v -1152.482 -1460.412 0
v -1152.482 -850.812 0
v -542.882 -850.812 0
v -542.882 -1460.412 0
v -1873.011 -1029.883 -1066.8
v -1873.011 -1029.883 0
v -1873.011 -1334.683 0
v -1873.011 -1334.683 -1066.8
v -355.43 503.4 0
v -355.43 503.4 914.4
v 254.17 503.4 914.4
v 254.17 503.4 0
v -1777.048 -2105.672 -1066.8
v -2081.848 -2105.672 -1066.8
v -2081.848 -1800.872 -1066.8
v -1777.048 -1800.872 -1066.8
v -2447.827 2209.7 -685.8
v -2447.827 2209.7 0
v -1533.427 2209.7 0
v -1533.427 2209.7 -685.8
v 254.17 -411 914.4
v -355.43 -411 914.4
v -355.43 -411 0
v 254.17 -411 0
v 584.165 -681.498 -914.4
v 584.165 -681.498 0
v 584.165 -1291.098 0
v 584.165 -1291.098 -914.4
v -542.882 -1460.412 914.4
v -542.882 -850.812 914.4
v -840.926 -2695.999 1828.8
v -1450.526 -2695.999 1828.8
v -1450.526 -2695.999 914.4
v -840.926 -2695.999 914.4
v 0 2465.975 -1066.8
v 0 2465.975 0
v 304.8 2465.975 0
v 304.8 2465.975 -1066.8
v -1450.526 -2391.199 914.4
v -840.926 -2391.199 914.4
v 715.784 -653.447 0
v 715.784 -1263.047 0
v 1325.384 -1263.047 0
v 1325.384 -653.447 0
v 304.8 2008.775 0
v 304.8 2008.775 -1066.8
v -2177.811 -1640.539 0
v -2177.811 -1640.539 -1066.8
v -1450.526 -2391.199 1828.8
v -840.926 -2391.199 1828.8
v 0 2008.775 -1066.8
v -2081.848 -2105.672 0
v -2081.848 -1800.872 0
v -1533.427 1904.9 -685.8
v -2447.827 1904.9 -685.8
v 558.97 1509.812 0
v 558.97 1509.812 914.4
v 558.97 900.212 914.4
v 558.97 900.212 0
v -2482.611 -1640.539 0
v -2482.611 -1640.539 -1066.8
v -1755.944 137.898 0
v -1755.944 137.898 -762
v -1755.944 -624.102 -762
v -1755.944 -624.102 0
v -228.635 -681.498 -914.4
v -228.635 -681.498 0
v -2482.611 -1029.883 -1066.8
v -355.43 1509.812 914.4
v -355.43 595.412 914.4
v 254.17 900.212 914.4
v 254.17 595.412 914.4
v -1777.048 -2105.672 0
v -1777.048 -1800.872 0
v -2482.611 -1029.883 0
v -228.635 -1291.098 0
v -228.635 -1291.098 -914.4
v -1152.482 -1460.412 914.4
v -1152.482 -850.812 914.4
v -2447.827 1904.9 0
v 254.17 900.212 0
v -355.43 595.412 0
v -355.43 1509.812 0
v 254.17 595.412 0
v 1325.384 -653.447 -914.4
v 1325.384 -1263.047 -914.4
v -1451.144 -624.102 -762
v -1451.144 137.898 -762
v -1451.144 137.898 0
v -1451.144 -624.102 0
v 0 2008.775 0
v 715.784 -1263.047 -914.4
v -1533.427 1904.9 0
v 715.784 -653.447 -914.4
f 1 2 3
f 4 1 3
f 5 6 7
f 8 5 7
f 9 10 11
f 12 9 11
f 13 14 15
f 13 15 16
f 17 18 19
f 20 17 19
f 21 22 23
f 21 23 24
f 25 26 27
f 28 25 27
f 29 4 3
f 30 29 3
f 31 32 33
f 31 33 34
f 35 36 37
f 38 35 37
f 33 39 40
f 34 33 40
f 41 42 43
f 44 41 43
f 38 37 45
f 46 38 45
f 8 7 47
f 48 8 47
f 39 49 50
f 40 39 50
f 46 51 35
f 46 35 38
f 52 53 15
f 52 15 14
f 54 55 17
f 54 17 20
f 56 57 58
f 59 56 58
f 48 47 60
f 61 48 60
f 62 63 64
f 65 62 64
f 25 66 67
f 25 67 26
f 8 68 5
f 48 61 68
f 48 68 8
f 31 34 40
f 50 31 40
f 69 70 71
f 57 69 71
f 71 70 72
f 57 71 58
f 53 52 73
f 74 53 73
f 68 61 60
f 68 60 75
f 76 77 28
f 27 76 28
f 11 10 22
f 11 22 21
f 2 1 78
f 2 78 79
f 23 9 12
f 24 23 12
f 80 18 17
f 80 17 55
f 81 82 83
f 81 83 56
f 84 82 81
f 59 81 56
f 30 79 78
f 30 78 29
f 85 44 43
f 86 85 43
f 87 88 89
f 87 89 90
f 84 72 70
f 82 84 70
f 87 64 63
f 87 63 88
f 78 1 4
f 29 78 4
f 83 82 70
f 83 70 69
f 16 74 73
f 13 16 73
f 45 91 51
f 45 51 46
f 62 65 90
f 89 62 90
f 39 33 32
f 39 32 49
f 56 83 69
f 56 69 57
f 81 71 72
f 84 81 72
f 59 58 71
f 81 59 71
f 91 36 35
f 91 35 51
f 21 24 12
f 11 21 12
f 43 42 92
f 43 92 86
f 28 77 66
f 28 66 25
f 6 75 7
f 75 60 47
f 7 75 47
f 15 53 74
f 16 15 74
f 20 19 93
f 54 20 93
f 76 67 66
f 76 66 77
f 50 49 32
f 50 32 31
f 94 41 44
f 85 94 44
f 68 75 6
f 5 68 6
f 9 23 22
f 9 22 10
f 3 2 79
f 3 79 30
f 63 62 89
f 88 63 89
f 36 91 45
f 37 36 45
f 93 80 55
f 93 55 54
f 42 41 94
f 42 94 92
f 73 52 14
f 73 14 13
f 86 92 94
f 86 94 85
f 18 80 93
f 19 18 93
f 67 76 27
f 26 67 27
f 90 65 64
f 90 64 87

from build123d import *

# Parameters (mm, degrees)
F0_W      = 609.6
F0_H      = 914.4
F1_DEPTH  = 914.4
F3_DEPTH  = 914.4
F4_W      = 609.6
F4_H      = 609.6
F5_DEPTH  = 914.4
F6_W      = 812.8
F6_H      = 609.6
F7_DEPTH  = 914.4
F8_W      = 609.6
F8_H      = 609.6
F9_DEPTH  = 914.4
F10_W     = 609.6
F10_H     = 304.8
F11_DEPTH = 914.4
F13_DEPTH = 1066.8
F14_W     = 304.8
F14_H     = 304.8
F15_DEPTH = 1066.8
F16_W     = 304.8
F16_H     = 762
F17_DEPTH = 762
F18_W     = 914.4
F18_H     = 304.8
F19_DEPTH = 685.8
F20_W     = 304.8
F20_H     = 457.2
F21_DEPTH = 1066.8


# Not quite as in the source:
# - a feature names something its author has since deleted; it is built from what else it names


with BuildPart() as f1:
    # F0 (on Top) → F1 (new body)
    with BuildSketch(Plane.XY):
        with Locations((-50.6302136928, 46.2002533887)):
            Rectangle(F0_W, F0_H)
    extrude(amount=F1_DEPTH)


with BuildPart() as f3:
    # F2 (on face) → F3 (new body)
    with BuildSketch(Plane(origin=(0, 0, 0), x_dir=(1, 0, 0), z_dir=(0, 0, -1))):
        Polygon((254.1697863072, -900.2123884309), (254.1697863072, -595.4123884309), (-355.4302136928, -595.4123884309), (-355.4302136928, -1509.8123884309), (558.9697863072, -1509.8123884309), (558.9697863072, -900.2123884309), align=None)
    extrude(amount=-F3_DEPTH)


with BuildPart() as f5:
    # F4 (on face) → F5 (new body)
    with BuildSketch(Plane(origin=(0, 0, 0), x_dir=(1, 0, 0), z_dir=(0, 0, -1))):
        with Locations((1020.5837786198, 958.2468374996)):
            Rectangle(F4_W, F4_H)
    extrude(amount=F5_DEPTH)


with BuildPart() as f7:
    # F6 (on face) → F7 (new body)
    with BuildSketch(Plane(origin=(0, 0, 0), x_dir=(1, 0, 0), z_dir=(0, 0, -1))):
        with Locations((177.7652353048, 986.2984619199)):
            Rectangle(F6_W, F6_H)
    extrude(amount=F7_DEPTH)


with BuildPart() as f9:
    # F8 (on face) → F9 (new body)
    with BuildSketch(Plane.XY):
        with Locations((-847.6822674274, -1155.6124973011)):
            Rectangle(F8_W, F8_H)
    extrude(amount=F9_DEPTH)


with BuildPart() as f11:
    # F10 (on face) → F11 (new body)
    with BuildSketch(Plane.XY.offset(914.4)):
        with Locations((-1145.7255238362, -2543.5986241634)):
            Rectangle(F10_W, F10_H)
    extrude(amount=F11_DEPTH)


with BuildPart() as f13:
    # F12 (on face) → F13 (new body)
    with BuildSketch(Plane(origin=(0, 0, 0), x_dir=(1, 0, 0), z_dir=(0, 0, -1))):
        Polygon((-2482.6113088184, 1029.8828289854), (-1873.0113088184, 1029.8828289854), (-1873.0113088184, 1334.6828289854), (-2177.8113088184, 1640.5393312868), (-2482.6113088184, 1640.5393312868), align=None)
    extrude(amount=F13_DEPTH)


with BuildPart() as f15:
    # F14 (on face) → F15 (new body)
    with BuildSketch(Plane(origin=(0, 0, 0), x_dir=(1, 0, 0), z_dir=(0, 0, -1))):
        with Locations((-1929.4477705223, 1953.2716274261)):
            Rectangle(F14_W, F14_H)
    extrude(amount=F15_DEPTH)


with BuildPart() as f17:
    # F16 (on face) → F17 (new body)
    with BuildSketch(Plane(origin=(0, 0, 0), x_dir=(1, 0, 0), z_dir=(0, 0, -1))):
        with Locations((-1603.5444736481, 243.1021227015)):
            Rectangle(F16_W, F16_H)
    extrude(amount=F17_DEPTH)


with BuildPart() as f19:
    # F18 (on face) → F19 (new body)
    with BuildSketch(Plane(origin=(0, 0, 0), x_dir=(1, 0, 0), z_dir=(0, 0, -1))):
        with Locations((-1990.6274676323, -2057.3001701469)):
            Rectangle(F18_W, F18_H)
    extrude(amount=F19_DEPTH)


with BuildPart() as f21:
    # F20 (on face) → F21 (new body)
    with BuildSketch(Plane(origin=(0, 0, 0), x_dir=(1, 0, 0), z_dir=(0, 0, -1))):
        with Locations((152.4, -2237.3750410851)):
            Rectangle(F20_W, F20_H)
    extrude(amount=F21_DEPTH)


solid = Compound([f1.part, f3.part, f5.part, f7.part, f9.part, f11.part, f13.part, f15.part, f17.part, f19.part, f21.part])
